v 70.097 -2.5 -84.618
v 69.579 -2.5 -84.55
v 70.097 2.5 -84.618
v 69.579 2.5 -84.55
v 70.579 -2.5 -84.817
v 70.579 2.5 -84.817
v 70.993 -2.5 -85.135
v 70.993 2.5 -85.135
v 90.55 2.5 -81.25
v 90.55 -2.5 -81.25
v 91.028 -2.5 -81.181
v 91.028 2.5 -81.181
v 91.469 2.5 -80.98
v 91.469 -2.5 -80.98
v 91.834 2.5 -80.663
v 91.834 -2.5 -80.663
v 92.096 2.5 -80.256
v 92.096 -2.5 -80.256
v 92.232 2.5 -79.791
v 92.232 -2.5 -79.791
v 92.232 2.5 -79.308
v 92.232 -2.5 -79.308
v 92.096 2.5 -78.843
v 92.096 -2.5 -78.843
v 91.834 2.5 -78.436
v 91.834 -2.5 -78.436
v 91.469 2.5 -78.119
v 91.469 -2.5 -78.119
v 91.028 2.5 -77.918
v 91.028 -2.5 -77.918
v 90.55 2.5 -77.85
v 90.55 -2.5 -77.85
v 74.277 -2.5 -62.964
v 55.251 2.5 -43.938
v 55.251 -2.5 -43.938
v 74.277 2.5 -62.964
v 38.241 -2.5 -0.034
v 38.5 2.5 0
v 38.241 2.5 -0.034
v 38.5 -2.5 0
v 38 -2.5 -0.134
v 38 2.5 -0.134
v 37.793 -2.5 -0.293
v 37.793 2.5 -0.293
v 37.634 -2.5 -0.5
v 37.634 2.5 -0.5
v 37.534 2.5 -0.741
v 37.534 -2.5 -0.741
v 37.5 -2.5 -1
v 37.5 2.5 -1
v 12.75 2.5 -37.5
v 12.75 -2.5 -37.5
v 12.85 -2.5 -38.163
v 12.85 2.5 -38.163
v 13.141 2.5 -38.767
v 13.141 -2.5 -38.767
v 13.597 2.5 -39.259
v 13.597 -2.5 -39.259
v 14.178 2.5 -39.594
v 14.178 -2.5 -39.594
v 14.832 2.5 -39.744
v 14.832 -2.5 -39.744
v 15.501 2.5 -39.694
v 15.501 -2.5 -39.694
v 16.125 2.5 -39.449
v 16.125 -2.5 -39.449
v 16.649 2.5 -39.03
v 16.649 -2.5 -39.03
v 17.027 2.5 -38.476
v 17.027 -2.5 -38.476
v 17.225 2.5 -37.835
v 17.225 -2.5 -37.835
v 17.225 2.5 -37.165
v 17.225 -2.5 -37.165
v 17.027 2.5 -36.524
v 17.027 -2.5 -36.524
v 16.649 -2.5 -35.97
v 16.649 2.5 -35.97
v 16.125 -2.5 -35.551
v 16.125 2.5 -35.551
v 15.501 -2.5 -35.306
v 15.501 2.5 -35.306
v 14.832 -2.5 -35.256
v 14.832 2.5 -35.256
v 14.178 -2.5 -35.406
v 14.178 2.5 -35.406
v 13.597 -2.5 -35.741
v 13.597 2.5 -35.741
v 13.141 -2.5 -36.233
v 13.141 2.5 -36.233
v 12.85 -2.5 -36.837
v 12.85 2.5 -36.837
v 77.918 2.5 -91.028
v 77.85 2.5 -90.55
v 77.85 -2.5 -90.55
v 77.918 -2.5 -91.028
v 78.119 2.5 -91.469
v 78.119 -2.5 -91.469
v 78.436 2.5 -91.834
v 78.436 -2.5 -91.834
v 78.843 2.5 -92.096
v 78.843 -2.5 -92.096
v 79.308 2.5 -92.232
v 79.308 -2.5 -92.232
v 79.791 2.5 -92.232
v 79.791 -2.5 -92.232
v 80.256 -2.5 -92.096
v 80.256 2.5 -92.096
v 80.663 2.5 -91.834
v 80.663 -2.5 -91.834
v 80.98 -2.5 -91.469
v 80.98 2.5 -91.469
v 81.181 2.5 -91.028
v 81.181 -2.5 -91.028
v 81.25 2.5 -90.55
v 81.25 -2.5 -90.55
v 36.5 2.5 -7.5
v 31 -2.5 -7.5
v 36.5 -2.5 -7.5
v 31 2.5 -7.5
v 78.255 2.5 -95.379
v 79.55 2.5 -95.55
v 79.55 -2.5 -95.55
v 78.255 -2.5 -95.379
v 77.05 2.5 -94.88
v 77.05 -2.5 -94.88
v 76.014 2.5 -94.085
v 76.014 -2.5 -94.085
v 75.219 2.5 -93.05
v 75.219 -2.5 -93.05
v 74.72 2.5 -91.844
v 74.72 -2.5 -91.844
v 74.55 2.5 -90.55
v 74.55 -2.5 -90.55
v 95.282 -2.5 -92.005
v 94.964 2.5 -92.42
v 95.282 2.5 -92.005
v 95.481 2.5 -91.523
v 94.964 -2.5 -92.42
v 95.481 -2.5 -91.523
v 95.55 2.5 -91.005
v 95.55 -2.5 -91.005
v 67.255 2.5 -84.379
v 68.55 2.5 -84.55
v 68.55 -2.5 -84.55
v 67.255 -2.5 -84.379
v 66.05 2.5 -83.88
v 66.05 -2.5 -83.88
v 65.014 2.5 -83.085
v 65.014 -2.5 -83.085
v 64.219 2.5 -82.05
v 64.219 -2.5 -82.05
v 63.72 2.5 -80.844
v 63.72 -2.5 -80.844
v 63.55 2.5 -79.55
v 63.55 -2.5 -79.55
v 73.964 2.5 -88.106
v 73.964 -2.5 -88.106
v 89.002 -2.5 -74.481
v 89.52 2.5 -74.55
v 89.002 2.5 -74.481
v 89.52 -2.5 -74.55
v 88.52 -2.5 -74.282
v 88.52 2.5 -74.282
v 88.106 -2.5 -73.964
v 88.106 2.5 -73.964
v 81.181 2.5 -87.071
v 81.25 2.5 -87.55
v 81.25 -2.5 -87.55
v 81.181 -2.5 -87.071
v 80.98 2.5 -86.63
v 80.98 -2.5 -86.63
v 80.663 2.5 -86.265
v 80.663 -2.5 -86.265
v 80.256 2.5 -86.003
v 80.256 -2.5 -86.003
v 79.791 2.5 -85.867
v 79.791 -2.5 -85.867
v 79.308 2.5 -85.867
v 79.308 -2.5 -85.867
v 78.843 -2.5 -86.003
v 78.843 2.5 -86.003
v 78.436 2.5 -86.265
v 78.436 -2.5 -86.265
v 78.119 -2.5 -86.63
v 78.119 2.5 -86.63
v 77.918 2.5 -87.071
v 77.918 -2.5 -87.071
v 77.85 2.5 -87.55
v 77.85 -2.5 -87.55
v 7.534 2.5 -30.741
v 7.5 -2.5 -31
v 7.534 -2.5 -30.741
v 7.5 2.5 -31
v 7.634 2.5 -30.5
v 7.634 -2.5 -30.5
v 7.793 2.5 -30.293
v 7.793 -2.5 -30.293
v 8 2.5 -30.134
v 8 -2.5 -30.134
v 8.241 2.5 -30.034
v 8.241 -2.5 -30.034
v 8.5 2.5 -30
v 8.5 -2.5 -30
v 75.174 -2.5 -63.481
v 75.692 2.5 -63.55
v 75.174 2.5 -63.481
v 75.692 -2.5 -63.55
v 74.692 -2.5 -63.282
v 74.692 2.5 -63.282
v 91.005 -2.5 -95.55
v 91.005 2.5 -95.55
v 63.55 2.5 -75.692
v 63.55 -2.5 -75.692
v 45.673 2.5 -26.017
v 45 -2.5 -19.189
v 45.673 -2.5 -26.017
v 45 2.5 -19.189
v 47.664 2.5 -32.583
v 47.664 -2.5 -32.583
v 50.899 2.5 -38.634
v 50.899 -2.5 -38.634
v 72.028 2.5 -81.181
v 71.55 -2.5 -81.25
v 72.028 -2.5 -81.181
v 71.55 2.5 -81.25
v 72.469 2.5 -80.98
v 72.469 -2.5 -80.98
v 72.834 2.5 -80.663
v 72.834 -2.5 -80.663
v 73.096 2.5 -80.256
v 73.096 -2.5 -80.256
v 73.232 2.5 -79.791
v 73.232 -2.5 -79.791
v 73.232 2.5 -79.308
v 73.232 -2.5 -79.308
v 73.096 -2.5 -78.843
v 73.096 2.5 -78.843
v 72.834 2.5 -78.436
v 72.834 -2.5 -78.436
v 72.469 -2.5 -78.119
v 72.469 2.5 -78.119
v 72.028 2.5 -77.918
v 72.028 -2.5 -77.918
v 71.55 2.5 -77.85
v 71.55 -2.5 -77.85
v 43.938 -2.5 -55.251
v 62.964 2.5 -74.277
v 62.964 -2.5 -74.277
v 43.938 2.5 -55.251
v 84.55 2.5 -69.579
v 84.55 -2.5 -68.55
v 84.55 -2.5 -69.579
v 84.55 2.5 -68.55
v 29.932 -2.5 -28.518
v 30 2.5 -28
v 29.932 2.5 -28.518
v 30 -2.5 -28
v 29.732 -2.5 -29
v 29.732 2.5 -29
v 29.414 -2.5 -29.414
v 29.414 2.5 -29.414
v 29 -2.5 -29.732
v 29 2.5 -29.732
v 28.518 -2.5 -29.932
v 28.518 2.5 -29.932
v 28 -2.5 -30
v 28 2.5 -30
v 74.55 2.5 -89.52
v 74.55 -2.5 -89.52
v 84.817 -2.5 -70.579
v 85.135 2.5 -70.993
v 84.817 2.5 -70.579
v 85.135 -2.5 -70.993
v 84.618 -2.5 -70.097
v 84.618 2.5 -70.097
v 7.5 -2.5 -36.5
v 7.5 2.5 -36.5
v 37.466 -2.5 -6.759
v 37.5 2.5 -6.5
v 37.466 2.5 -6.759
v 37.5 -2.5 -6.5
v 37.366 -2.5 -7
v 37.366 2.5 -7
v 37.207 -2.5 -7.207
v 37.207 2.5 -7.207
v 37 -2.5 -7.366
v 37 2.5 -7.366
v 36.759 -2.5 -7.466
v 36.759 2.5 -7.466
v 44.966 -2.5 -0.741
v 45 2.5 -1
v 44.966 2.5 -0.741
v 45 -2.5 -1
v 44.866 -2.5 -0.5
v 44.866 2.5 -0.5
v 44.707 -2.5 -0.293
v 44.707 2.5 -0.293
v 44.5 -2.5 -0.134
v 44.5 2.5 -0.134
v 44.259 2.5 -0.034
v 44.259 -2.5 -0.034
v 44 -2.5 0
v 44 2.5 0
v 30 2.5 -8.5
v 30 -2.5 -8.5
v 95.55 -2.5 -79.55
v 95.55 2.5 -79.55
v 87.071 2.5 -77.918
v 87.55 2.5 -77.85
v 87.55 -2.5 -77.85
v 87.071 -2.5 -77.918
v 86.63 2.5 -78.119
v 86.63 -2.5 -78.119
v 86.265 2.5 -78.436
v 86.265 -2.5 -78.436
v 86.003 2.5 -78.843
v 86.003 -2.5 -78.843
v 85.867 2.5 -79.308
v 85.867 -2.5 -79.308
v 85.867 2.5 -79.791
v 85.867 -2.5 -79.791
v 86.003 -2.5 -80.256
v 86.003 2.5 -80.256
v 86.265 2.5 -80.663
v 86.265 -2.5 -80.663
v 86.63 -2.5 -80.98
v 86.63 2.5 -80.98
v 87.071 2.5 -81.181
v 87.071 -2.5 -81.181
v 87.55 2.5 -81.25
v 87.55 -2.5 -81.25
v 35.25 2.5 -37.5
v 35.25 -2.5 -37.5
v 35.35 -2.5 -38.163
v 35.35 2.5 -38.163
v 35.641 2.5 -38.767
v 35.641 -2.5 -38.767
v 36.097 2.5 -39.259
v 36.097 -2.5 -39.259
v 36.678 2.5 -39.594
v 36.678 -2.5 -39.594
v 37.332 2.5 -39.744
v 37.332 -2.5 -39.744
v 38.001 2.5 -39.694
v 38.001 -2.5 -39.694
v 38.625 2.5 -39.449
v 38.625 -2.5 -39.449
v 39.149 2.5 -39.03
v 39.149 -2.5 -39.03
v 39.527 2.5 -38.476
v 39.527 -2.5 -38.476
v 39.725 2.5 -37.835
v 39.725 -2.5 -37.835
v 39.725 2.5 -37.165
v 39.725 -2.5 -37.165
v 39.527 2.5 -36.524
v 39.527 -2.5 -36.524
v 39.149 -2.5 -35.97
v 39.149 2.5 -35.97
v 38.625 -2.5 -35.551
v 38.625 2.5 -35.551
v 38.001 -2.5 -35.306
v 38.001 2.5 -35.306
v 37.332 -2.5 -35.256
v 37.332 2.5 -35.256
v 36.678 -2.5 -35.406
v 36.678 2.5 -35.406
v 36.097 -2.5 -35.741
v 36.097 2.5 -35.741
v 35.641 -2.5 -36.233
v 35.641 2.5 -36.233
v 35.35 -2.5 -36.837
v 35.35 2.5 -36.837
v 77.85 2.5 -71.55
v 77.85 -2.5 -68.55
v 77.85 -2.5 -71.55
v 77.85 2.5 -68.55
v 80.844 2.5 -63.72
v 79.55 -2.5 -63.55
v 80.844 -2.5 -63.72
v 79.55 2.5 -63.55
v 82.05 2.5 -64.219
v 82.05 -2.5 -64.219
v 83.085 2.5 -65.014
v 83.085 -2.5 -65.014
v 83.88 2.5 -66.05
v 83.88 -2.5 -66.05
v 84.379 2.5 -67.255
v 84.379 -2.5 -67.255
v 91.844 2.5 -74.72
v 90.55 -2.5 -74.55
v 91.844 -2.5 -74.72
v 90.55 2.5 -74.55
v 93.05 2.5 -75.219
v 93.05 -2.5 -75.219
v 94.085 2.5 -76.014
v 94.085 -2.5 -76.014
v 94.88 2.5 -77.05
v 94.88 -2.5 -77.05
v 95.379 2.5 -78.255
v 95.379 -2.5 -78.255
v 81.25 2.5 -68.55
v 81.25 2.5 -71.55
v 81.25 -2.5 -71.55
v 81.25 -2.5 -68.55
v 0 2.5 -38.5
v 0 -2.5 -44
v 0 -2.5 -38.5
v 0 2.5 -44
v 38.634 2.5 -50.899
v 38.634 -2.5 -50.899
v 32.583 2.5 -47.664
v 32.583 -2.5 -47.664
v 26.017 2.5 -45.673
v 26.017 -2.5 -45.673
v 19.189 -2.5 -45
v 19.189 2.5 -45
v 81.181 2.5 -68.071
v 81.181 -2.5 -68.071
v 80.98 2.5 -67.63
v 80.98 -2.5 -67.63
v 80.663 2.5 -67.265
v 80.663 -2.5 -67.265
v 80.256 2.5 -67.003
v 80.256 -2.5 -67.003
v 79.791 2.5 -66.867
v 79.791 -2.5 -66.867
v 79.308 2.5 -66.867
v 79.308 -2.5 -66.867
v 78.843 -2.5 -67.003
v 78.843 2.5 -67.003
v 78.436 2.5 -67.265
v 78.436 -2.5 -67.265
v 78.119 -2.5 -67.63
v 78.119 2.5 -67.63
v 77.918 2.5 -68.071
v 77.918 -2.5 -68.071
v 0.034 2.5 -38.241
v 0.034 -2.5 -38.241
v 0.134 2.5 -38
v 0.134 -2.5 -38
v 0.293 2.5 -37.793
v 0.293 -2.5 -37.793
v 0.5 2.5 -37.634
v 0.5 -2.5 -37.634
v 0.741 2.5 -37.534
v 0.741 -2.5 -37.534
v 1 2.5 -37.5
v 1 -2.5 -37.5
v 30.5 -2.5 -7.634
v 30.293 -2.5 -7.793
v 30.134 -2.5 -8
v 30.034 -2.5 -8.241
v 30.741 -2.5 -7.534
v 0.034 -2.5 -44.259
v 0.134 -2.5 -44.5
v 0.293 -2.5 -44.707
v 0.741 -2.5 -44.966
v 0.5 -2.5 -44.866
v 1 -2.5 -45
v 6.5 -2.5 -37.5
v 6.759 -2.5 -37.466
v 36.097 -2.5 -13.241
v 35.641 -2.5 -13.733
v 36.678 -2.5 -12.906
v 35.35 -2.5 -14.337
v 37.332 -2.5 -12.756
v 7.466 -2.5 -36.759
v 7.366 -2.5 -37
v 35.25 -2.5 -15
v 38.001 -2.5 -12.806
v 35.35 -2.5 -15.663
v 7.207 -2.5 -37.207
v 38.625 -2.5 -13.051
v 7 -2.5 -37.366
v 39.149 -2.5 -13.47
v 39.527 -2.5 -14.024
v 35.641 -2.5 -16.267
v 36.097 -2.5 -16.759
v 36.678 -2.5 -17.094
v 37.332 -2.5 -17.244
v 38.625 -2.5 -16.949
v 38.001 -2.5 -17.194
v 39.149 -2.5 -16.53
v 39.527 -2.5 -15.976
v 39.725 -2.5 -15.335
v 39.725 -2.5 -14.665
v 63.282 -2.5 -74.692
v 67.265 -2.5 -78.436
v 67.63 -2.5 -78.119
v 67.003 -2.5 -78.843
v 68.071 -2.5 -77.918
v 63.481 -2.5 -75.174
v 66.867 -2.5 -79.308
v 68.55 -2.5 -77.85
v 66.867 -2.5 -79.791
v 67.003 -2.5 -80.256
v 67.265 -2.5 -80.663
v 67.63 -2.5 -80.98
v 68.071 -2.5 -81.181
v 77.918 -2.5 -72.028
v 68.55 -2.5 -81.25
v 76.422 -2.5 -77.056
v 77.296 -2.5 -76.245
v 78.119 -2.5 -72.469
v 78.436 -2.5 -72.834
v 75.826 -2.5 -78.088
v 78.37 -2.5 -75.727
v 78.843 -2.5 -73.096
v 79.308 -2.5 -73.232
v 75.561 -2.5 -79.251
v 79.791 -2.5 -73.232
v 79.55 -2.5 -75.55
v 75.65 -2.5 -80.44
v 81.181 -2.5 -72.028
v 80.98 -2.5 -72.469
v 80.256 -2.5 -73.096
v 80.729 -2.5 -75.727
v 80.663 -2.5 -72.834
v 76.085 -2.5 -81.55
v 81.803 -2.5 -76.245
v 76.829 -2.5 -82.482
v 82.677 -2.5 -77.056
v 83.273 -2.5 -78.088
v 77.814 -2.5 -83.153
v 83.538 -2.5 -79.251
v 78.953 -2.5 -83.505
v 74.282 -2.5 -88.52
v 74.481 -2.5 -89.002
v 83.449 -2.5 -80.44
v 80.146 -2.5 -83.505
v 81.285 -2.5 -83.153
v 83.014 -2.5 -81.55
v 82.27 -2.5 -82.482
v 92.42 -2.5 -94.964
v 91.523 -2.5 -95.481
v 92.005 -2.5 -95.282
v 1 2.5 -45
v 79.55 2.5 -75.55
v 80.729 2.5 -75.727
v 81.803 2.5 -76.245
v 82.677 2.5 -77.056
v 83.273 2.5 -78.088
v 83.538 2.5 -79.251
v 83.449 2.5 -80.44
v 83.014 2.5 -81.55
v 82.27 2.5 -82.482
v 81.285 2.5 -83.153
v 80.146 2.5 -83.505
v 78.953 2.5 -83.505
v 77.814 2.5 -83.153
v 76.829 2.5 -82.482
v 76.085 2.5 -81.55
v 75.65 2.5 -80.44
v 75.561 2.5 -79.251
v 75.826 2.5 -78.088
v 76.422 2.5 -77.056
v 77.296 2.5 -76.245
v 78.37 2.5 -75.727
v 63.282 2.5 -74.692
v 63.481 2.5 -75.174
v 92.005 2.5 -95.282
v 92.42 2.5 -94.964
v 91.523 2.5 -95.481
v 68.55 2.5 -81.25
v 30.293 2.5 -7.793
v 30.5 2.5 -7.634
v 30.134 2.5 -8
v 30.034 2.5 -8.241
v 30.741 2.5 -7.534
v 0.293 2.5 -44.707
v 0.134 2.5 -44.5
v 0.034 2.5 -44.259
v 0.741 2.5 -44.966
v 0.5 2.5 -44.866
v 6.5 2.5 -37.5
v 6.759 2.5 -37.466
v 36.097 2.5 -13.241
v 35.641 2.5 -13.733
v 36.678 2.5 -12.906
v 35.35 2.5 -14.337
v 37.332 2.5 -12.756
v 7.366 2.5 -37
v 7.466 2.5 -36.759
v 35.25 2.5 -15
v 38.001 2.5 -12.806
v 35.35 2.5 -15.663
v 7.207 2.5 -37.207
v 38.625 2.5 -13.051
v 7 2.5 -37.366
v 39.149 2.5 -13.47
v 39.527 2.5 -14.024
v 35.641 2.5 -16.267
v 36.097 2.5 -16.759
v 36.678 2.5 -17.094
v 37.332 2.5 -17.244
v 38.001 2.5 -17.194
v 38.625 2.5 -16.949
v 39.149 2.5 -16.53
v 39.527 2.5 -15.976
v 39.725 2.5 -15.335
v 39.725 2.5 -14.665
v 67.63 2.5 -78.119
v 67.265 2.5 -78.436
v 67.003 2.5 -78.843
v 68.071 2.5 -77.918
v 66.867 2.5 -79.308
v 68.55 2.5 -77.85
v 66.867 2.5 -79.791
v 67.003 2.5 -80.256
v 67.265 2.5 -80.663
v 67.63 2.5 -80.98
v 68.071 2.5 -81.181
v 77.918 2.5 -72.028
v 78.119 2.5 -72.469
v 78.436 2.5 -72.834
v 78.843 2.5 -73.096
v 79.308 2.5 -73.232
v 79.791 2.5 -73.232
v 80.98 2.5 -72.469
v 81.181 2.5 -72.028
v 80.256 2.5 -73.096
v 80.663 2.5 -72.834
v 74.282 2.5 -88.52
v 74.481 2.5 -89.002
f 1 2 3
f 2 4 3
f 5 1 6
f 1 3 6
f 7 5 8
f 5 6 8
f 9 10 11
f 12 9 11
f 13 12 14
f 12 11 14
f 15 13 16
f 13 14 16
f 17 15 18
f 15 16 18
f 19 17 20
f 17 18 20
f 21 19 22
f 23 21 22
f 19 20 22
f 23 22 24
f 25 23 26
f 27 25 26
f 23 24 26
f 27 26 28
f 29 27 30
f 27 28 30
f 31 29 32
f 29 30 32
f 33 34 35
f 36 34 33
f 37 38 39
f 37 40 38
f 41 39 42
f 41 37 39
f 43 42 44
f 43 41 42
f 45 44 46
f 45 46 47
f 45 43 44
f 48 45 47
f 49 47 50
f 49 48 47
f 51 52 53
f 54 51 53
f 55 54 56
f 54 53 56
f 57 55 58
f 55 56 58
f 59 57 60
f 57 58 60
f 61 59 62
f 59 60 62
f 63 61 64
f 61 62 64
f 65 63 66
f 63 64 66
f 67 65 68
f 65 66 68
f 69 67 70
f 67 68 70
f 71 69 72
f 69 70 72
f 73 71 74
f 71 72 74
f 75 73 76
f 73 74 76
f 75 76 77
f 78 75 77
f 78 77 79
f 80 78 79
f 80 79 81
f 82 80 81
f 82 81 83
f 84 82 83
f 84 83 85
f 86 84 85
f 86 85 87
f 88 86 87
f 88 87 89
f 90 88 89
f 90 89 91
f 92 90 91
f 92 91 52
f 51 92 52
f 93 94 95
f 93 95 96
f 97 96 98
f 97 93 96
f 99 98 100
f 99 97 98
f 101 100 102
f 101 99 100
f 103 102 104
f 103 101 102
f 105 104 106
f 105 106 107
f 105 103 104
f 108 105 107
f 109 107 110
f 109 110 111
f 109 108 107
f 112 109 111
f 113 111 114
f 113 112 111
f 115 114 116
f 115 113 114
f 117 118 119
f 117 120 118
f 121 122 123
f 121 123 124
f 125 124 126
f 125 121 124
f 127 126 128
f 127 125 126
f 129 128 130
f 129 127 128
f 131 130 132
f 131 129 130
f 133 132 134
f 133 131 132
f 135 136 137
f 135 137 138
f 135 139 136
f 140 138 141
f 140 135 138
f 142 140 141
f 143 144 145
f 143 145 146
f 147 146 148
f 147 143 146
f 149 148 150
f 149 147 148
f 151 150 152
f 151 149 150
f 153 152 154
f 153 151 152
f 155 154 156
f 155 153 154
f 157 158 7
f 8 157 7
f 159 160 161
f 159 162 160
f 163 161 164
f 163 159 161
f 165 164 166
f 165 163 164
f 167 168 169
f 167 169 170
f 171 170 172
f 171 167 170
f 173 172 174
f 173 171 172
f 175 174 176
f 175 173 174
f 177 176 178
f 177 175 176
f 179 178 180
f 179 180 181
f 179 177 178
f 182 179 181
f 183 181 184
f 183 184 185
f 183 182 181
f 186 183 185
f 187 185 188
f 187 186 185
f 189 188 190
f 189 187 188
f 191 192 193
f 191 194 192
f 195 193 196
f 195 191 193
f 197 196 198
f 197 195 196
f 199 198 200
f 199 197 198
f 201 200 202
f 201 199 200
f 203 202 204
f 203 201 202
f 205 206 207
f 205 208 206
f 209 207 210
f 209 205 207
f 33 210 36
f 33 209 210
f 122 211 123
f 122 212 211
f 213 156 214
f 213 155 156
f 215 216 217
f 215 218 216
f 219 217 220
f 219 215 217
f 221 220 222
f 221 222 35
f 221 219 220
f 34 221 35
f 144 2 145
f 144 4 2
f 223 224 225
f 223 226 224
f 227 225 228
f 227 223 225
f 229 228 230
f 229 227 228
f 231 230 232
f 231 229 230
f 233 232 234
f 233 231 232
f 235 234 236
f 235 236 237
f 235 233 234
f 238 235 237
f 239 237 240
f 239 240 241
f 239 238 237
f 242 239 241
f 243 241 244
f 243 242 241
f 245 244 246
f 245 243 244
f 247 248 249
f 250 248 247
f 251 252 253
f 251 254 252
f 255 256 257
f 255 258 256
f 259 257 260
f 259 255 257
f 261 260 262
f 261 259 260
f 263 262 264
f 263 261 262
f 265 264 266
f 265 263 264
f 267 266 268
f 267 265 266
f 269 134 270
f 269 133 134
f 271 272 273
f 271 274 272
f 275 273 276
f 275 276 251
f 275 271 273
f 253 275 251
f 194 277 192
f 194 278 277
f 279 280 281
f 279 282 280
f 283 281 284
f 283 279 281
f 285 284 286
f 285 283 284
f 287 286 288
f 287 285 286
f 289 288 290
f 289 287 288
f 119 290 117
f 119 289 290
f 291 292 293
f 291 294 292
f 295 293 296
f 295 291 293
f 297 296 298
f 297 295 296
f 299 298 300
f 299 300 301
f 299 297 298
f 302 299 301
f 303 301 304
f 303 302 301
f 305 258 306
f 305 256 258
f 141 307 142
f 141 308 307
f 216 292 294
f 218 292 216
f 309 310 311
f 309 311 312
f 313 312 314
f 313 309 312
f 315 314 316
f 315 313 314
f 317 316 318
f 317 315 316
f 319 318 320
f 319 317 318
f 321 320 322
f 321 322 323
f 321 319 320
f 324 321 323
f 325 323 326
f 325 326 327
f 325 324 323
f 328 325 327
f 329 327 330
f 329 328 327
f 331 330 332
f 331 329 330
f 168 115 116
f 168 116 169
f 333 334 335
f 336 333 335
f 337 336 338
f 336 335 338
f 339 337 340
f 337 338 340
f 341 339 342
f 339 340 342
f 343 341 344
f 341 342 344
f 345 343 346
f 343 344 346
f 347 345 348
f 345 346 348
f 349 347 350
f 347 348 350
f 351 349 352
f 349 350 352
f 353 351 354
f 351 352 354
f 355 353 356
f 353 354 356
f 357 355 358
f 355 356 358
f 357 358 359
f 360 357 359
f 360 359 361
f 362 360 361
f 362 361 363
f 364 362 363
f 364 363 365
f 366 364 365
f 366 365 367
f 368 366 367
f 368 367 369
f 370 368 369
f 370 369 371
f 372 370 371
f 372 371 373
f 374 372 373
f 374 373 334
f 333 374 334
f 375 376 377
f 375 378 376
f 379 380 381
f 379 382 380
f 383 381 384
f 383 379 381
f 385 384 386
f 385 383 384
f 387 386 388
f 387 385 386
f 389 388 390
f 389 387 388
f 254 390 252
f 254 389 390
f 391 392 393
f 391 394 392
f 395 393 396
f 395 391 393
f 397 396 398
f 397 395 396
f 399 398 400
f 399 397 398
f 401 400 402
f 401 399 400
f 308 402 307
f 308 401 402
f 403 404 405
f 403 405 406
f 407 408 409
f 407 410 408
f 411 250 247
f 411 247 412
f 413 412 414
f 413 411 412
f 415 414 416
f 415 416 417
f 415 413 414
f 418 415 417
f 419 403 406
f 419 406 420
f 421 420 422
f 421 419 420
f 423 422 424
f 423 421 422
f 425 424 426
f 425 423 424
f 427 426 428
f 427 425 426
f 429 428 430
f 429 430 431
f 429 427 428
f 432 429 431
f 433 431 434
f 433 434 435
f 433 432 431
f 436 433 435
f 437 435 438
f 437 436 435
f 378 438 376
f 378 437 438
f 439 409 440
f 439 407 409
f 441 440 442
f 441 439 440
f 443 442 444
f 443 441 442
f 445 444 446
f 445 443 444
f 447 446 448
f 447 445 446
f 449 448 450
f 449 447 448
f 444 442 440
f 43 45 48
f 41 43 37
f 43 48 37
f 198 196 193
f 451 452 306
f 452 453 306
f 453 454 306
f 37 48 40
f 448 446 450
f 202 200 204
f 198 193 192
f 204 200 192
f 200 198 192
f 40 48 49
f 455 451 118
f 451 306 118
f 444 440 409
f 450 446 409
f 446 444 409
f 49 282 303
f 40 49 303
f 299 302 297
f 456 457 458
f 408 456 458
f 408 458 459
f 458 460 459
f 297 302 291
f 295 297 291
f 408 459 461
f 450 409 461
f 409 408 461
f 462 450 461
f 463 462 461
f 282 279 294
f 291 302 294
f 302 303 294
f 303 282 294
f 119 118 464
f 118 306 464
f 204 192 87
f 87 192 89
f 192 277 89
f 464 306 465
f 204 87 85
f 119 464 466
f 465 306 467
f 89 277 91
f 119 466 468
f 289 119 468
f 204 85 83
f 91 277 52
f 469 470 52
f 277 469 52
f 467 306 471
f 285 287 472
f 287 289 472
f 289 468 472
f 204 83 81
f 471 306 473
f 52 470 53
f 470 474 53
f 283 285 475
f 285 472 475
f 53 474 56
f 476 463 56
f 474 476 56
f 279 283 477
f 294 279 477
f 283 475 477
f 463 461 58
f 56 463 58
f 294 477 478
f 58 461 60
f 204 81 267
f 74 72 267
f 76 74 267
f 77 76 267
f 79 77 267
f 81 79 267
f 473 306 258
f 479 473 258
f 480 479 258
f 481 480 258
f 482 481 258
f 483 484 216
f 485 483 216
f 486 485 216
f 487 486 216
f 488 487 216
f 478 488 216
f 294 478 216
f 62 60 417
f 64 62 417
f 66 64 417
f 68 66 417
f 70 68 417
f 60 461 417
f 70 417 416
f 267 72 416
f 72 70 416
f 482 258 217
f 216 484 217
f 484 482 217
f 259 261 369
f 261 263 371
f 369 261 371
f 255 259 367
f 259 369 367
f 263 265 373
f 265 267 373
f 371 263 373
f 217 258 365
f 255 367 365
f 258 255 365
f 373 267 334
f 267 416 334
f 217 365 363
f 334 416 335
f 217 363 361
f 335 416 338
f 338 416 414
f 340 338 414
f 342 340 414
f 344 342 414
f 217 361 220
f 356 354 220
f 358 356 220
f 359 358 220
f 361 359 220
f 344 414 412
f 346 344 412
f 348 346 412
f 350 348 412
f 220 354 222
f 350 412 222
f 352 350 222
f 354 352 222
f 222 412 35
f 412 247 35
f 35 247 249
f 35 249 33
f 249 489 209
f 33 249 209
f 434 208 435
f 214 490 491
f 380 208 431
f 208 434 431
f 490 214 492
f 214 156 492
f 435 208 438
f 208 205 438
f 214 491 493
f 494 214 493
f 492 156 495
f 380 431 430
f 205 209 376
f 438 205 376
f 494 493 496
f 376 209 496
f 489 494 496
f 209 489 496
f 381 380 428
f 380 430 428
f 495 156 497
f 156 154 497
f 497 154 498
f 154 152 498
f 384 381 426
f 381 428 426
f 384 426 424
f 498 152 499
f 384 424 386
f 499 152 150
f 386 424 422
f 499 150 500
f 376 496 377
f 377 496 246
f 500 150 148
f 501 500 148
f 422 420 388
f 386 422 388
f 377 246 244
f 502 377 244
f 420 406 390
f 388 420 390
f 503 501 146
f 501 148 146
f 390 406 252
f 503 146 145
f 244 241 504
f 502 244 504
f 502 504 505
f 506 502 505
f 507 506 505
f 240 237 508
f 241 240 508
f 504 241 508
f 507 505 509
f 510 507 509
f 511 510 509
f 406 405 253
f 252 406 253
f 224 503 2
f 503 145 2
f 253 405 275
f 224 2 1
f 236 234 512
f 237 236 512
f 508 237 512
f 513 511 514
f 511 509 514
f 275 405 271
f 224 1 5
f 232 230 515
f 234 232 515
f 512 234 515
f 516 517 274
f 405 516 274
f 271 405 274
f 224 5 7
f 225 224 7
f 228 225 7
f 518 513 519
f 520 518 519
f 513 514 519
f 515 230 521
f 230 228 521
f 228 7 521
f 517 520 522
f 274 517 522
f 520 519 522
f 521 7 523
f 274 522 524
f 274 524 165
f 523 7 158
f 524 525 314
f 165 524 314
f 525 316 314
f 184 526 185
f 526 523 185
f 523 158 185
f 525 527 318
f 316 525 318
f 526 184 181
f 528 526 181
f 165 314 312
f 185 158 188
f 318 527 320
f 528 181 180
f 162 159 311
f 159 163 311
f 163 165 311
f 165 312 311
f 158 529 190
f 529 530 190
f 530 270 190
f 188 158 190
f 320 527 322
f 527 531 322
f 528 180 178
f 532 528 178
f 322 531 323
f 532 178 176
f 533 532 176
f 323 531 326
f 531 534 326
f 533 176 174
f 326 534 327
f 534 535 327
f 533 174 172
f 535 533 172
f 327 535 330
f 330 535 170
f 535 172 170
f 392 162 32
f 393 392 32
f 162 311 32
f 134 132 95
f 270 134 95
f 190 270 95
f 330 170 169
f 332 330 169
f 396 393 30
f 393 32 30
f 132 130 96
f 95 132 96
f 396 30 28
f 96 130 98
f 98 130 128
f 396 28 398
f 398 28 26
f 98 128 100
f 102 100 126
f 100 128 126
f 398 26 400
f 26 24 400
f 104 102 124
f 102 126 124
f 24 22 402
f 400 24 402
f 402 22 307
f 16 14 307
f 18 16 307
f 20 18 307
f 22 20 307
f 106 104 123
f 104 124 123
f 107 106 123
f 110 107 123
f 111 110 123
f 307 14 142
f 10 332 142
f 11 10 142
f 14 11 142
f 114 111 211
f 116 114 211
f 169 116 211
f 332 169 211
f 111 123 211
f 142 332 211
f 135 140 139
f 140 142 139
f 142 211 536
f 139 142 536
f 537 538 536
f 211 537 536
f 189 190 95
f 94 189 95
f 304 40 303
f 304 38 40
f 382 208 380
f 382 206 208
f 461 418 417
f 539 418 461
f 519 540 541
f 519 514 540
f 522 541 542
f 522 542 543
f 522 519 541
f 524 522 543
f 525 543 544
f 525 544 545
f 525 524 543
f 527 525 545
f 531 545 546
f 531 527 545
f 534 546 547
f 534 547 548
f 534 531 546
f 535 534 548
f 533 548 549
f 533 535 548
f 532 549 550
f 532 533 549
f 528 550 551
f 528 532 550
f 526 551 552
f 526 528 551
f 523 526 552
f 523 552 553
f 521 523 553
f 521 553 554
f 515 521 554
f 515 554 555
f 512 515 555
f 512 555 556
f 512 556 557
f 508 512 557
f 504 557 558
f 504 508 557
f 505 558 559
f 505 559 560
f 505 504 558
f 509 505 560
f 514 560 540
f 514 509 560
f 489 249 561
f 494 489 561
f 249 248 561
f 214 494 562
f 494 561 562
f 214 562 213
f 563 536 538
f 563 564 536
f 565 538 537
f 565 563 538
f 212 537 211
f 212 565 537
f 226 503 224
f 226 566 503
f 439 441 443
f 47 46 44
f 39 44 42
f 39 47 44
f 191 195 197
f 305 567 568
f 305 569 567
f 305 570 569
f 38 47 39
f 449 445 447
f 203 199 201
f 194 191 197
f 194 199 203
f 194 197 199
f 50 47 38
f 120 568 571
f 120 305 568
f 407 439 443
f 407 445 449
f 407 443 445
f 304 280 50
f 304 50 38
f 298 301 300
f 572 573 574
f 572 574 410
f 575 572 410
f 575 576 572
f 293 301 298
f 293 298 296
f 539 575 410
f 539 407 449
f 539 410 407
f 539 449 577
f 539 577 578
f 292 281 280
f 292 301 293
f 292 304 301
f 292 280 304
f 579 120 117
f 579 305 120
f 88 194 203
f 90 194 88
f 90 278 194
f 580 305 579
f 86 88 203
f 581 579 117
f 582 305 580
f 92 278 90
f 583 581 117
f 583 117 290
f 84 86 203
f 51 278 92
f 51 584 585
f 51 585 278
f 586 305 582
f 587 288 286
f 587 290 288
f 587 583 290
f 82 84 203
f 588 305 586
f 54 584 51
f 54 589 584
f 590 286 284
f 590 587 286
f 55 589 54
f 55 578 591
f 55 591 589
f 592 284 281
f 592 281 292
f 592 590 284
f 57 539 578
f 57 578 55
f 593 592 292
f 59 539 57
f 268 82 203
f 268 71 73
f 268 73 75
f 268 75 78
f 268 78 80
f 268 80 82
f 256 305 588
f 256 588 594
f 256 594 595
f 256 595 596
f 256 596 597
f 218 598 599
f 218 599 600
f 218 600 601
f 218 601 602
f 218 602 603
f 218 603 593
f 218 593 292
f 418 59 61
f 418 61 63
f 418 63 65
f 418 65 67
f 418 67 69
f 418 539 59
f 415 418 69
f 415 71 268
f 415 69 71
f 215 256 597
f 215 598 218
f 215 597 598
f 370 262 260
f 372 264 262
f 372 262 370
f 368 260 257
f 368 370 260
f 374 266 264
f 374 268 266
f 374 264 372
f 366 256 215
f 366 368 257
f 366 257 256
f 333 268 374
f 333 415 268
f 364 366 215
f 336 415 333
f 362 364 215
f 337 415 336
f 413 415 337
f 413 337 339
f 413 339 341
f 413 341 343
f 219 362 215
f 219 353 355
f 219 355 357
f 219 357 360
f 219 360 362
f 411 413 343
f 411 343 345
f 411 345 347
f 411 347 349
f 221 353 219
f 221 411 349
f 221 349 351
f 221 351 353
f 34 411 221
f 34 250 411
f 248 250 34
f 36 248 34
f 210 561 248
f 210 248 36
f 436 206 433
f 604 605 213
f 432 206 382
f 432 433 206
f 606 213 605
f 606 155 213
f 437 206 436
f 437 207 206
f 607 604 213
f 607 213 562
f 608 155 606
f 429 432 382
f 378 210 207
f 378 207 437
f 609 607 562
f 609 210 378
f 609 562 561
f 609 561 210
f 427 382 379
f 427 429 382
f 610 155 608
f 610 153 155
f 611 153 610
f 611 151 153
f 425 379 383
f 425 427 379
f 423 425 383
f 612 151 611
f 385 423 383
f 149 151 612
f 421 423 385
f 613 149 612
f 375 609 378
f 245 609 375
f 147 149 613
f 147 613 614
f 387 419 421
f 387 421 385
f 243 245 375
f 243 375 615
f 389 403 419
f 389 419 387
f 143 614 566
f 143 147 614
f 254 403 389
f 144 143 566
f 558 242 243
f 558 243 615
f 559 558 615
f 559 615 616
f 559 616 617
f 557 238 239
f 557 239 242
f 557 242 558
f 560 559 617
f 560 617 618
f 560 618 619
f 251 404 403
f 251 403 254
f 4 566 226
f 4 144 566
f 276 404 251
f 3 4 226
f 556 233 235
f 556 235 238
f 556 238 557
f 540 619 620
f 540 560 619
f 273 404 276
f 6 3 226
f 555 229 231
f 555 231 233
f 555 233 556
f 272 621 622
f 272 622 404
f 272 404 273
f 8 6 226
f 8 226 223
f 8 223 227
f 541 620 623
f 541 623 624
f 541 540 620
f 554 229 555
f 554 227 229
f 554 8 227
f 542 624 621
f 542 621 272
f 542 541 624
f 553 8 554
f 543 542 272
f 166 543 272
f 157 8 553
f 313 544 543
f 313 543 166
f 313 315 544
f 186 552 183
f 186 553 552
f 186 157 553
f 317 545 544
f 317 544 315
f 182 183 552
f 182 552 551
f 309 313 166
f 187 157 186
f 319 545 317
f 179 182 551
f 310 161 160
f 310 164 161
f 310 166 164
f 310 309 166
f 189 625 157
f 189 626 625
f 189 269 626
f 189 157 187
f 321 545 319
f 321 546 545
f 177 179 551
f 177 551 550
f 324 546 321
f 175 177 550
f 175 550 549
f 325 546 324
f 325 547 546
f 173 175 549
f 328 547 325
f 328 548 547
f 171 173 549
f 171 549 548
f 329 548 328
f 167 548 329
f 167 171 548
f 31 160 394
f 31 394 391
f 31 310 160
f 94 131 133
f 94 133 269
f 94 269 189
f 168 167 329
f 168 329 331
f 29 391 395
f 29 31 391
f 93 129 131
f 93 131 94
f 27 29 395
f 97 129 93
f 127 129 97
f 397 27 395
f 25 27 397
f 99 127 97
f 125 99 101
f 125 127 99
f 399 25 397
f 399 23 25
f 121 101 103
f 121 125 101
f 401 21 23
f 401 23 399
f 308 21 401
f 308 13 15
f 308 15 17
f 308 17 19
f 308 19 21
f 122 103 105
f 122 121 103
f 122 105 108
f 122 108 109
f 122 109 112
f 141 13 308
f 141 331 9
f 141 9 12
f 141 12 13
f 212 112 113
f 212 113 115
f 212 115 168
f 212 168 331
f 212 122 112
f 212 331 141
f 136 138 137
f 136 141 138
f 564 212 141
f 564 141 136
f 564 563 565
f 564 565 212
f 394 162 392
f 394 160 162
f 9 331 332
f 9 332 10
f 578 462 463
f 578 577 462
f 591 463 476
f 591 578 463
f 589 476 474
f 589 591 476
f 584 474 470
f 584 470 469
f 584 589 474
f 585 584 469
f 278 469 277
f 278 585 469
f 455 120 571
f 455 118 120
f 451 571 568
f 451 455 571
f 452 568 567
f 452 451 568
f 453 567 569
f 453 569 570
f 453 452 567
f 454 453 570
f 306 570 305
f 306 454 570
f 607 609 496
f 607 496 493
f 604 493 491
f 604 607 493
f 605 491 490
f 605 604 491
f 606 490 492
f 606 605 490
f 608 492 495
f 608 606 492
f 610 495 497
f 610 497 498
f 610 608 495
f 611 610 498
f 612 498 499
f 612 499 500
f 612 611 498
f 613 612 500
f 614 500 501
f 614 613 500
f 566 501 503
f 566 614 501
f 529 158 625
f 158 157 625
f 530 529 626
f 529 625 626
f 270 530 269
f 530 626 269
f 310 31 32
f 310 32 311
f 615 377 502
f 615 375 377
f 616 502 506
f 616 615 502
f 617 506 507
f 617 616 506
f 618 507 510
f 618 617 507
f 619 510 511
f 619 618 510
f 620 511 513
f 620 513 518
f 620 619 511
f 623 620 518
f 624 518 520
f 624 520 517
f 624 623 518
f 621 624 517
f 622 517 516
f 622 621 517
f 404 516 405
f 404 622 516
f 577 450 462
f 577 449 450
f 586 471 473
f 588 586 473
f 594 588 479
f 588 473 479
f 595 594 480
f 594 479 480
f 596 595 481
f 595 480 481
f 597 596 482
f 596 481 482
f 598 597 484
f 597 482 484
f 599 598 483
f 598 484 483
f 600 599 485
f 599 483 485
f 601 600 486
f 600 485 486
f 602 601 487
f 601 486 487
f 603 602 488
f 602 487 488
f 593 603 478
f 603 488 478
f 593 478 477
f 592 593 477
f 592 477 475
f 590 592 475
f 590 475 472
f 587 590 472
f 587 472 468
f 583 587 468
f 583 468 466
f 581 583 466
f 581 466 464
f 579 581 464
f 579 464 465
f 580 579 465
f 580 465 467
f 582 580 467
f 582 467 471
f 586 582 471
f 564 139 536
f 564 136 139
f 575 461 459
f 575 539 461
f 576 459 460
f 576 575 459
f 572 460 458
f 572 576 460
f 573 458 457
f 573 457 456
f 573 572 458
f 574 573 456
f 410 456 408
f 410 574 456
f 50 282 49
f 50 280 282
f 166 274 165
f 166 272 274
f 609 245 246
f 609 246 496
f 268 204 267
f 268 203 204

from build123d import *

# Parameters (mm, degrees)
SKETCH1_R                = 4
BOSS_EXTRUDE1_DEPTH      = 2.5
FILLET1_R                = 2
FILLET2_R                = 1
M4_CLEARANCE_HOLE1_D     = 4.5
M4_CLEARANCE_HOLE1_DEPTH = 5.2
M4_CLEARANCE_HOLE1_TIP   = 1.351936393


with BuildPart() as part:
    # Sketch1 → Boss-Extrude1 (new, symmetric)
    with BuildSketch(Plane(origin=(0, 0, 0), x_dir=(1, 0, 0), z_dir=(0, 1, 0))):
        with BuildLine():
            Line((95.549512883, 91.833784131), (91.833784131, 95.549512883))
            Line((91.833784131, 95.549512883), (79.549512883, 95.549512883))
            ThreePointArc((79.549512883, 95.549512883), (76.013978978, 94.085046789), (74.549512883, 90.549512883))
            Line((74.549512883, 90.549512883), (74.549512883, 88.691648507))
            Line((74.549512883, 88.691648507), (70.40737726, 84.549512883))
            Line((70.40737726, 84.549512883), (68.549512883, 84.549512883))
            ThreePointArc((68.549512883, 84.549512883), (65.013978978, 83.085046789), (63.549512883, 79.549512883))
            Line((63.549512883, 79.549512883), (63.549512883, 74.863221382))
            Line((63.549512883, 74.863221382), (43.937554159, 55.251262658))
            ThreePointArc((43.937554159, 55.251262658), (32.582736951, 47.664216362), (19.188816818, 45))
            Line((19.188816818, 45), (0, 45))
            Line((0, 45), (0, 37.5))
            Line((0, 37.5), (7.5, 37.5))
            Line((7.5, 37.5), (7.5, 30))
            Line((7.5, 30), (30, 30))
            Line((30, 30), (30, 7.5))
            Line((30, 7.5), (37.5, 7.5))
            Line((37.5, 7.5), (37.5, 0))
            Line((37.5, 0), (45, 0))
            Line((45, 0), (45, 19.188816818))
            ThreePointArc((45, 19.188816818), (47.664216362, 32.582736951), (55.251262658, 43.937554159))
            Line((55.251262658, 43.937554159), (74.863221382, 63.549512883))
            Line((74.863221382, 63.549512883), (79.549512883, 63.549512883))
            ThreePointArc((79.549512883, 63.549512883), (83.085046789, 65.013978978), (84.549512883, 68.549512883))
            Line((84.549512883, 68.549512883), (84.549512883, 70.40737726))
            Line((84.549512883, 70.40737726), (88.691648507, 74.549512883))
            Line((88.691648507, 74.549512883), (90.549512883, 74.549512883))
            ThreePointArc((90.549512883, 74.549512883), (94.085046789, 76.013978978), (95.549512883, 79.549512883))
            Line((95.549512883, 79.549512883), (95.549512883, 91.833784131))
        make_face()
        with Locations(Location((79.549512883, 79.549512883, 0), (0, 0, 270))):
            Circle(SKETCH1_R, mode=Mode.SUBTRACT)
        with BuildLine():
            Line((87.549512883, 81.249512883), (90.549512883, 81.249512883))
            ThreePointArc((90.549512883, 81.249512883), (92.249512883, 79.549512883), (90.549512883, 77.849512883))
            Line((90.549512883, 77.849512883), (87.549512883, 77.849512883))
            ThreePointArc((87.549512883, 77.849512883), (85.849512883, 79.549512883), (87.549512883, 81.249512883))
        make_face(mode=Mode.SUBTRACT)
        with BuildLine():
            Line((81.249512883, 71.549512883), (81.249512883, 68.549512883))
            ThreePointArc((81.249512883, 68.549512883), (79.549512883, 66.849512883), (77.849512883, 68.549512883))
            Line((77.849512883, 68.549512883), (77.849512883, 71.549512883))
            ThreePointArc((77.849512883, 71.549512883), (79.549512883, 73.249512883), (81.249512883, 71.549512883))
        make_face(mode=Mode.SUBTRACT)
        with BuildLine():
            Line((71.549512883, 77.849512883), (68.549512883, 77.849512883))
            ThreePointArc((68.549512883, 77.849512883), (66.849512883, 79.549512883), (68.549512883, 81.249512883))
            Line((68.549512883, 81.249512883), (71.549512883, 81.249512883))
            ThreePointArc((71.549512883, 81.249512883), (73.249512883, 79.549512883), (71.549512883, 77.849512883))
        make_face(mode=Mode.SUBTRACT)
        with BuildLine():
            Line((77.849512883, 87.549512883), (77.849512883, 90.549512883))
            ThreePointArc((77.849512883, 90.549512883), (79.549512883, 92.249512883), (81.249512883, 90.549512883))
            Line((81.249512883, 90.549512883), (81.249512883, 87.549512883))
            ThreePointArc((81.249512883, 87.549512883), (79.549512883, 85.849512883), (77.849512883, 87.549512883))
        make_face(mode=Mode.SUBTRACT)
    extrude(amount=BOSS_EXTRUDE1_DEPTH, both=True)

    # Fillet1
    fillet1_edges = [part.edges().sort_by_distance(p)[0] for p in [
        (91.833784131, 0, -95.549512883),
        (95.549512883, 0, -91.833784131),
        (88.691648507, 0, -74.549512883),
        (84.549512883, 0, -70.40737726),
        (74.863221382, 0, -63.549512883),
        (30, 0, -30),
        (63.549512883, 0, -74.863221382),
        (70.40737726, 0, -84.549512883),
        (74.549512883, 0, -88.691648507),
    ]]
    fillet(fillet1_edges, radius=FILLET1_R)

    # Fillet2
    fillet2_edges = [part.edges().sort_by_distance(p)[0] for p in [
        (45, 0, 0),
        (37.5, 0, 0),
        (37.5, 0, -7.5),
        (30, 0, -7.5),
        (7.5, 0, -30),
        (7.5, 0, -37.5),
        (0, 0, -37.5),
        (0, 0, -45),
    ]]
    fillet(fillet2_edges, radius=FILLET2_R)

    # M4 Clearance Hole1
    with Locations(Plane(origin=(0, 2.5, 0), x_dir=(1, 0, 0), z_dir=(0, 1, 0))):
        with Locations((15, 37.5), (37.5, 15), (37.5, 37.5)):
            Hole(M4_CLEARANCE_HOLE1_D / 2, depth=M4_CLEARANCE_HOLE1_DEPTH)
            with Locations((0, 0, -(M4_CLEARANCE_HOLE1_DEPTH + M4_CLEARANCE_HOLE1_TIP / 2))):  # 118° drill point
                Cone(0, M4_CLEARANCE_HOLE1_D / 2, M4_CLEARANCE_HOLE1_TIP, mode=Mode.SUBTRACT)


solid = part.part
